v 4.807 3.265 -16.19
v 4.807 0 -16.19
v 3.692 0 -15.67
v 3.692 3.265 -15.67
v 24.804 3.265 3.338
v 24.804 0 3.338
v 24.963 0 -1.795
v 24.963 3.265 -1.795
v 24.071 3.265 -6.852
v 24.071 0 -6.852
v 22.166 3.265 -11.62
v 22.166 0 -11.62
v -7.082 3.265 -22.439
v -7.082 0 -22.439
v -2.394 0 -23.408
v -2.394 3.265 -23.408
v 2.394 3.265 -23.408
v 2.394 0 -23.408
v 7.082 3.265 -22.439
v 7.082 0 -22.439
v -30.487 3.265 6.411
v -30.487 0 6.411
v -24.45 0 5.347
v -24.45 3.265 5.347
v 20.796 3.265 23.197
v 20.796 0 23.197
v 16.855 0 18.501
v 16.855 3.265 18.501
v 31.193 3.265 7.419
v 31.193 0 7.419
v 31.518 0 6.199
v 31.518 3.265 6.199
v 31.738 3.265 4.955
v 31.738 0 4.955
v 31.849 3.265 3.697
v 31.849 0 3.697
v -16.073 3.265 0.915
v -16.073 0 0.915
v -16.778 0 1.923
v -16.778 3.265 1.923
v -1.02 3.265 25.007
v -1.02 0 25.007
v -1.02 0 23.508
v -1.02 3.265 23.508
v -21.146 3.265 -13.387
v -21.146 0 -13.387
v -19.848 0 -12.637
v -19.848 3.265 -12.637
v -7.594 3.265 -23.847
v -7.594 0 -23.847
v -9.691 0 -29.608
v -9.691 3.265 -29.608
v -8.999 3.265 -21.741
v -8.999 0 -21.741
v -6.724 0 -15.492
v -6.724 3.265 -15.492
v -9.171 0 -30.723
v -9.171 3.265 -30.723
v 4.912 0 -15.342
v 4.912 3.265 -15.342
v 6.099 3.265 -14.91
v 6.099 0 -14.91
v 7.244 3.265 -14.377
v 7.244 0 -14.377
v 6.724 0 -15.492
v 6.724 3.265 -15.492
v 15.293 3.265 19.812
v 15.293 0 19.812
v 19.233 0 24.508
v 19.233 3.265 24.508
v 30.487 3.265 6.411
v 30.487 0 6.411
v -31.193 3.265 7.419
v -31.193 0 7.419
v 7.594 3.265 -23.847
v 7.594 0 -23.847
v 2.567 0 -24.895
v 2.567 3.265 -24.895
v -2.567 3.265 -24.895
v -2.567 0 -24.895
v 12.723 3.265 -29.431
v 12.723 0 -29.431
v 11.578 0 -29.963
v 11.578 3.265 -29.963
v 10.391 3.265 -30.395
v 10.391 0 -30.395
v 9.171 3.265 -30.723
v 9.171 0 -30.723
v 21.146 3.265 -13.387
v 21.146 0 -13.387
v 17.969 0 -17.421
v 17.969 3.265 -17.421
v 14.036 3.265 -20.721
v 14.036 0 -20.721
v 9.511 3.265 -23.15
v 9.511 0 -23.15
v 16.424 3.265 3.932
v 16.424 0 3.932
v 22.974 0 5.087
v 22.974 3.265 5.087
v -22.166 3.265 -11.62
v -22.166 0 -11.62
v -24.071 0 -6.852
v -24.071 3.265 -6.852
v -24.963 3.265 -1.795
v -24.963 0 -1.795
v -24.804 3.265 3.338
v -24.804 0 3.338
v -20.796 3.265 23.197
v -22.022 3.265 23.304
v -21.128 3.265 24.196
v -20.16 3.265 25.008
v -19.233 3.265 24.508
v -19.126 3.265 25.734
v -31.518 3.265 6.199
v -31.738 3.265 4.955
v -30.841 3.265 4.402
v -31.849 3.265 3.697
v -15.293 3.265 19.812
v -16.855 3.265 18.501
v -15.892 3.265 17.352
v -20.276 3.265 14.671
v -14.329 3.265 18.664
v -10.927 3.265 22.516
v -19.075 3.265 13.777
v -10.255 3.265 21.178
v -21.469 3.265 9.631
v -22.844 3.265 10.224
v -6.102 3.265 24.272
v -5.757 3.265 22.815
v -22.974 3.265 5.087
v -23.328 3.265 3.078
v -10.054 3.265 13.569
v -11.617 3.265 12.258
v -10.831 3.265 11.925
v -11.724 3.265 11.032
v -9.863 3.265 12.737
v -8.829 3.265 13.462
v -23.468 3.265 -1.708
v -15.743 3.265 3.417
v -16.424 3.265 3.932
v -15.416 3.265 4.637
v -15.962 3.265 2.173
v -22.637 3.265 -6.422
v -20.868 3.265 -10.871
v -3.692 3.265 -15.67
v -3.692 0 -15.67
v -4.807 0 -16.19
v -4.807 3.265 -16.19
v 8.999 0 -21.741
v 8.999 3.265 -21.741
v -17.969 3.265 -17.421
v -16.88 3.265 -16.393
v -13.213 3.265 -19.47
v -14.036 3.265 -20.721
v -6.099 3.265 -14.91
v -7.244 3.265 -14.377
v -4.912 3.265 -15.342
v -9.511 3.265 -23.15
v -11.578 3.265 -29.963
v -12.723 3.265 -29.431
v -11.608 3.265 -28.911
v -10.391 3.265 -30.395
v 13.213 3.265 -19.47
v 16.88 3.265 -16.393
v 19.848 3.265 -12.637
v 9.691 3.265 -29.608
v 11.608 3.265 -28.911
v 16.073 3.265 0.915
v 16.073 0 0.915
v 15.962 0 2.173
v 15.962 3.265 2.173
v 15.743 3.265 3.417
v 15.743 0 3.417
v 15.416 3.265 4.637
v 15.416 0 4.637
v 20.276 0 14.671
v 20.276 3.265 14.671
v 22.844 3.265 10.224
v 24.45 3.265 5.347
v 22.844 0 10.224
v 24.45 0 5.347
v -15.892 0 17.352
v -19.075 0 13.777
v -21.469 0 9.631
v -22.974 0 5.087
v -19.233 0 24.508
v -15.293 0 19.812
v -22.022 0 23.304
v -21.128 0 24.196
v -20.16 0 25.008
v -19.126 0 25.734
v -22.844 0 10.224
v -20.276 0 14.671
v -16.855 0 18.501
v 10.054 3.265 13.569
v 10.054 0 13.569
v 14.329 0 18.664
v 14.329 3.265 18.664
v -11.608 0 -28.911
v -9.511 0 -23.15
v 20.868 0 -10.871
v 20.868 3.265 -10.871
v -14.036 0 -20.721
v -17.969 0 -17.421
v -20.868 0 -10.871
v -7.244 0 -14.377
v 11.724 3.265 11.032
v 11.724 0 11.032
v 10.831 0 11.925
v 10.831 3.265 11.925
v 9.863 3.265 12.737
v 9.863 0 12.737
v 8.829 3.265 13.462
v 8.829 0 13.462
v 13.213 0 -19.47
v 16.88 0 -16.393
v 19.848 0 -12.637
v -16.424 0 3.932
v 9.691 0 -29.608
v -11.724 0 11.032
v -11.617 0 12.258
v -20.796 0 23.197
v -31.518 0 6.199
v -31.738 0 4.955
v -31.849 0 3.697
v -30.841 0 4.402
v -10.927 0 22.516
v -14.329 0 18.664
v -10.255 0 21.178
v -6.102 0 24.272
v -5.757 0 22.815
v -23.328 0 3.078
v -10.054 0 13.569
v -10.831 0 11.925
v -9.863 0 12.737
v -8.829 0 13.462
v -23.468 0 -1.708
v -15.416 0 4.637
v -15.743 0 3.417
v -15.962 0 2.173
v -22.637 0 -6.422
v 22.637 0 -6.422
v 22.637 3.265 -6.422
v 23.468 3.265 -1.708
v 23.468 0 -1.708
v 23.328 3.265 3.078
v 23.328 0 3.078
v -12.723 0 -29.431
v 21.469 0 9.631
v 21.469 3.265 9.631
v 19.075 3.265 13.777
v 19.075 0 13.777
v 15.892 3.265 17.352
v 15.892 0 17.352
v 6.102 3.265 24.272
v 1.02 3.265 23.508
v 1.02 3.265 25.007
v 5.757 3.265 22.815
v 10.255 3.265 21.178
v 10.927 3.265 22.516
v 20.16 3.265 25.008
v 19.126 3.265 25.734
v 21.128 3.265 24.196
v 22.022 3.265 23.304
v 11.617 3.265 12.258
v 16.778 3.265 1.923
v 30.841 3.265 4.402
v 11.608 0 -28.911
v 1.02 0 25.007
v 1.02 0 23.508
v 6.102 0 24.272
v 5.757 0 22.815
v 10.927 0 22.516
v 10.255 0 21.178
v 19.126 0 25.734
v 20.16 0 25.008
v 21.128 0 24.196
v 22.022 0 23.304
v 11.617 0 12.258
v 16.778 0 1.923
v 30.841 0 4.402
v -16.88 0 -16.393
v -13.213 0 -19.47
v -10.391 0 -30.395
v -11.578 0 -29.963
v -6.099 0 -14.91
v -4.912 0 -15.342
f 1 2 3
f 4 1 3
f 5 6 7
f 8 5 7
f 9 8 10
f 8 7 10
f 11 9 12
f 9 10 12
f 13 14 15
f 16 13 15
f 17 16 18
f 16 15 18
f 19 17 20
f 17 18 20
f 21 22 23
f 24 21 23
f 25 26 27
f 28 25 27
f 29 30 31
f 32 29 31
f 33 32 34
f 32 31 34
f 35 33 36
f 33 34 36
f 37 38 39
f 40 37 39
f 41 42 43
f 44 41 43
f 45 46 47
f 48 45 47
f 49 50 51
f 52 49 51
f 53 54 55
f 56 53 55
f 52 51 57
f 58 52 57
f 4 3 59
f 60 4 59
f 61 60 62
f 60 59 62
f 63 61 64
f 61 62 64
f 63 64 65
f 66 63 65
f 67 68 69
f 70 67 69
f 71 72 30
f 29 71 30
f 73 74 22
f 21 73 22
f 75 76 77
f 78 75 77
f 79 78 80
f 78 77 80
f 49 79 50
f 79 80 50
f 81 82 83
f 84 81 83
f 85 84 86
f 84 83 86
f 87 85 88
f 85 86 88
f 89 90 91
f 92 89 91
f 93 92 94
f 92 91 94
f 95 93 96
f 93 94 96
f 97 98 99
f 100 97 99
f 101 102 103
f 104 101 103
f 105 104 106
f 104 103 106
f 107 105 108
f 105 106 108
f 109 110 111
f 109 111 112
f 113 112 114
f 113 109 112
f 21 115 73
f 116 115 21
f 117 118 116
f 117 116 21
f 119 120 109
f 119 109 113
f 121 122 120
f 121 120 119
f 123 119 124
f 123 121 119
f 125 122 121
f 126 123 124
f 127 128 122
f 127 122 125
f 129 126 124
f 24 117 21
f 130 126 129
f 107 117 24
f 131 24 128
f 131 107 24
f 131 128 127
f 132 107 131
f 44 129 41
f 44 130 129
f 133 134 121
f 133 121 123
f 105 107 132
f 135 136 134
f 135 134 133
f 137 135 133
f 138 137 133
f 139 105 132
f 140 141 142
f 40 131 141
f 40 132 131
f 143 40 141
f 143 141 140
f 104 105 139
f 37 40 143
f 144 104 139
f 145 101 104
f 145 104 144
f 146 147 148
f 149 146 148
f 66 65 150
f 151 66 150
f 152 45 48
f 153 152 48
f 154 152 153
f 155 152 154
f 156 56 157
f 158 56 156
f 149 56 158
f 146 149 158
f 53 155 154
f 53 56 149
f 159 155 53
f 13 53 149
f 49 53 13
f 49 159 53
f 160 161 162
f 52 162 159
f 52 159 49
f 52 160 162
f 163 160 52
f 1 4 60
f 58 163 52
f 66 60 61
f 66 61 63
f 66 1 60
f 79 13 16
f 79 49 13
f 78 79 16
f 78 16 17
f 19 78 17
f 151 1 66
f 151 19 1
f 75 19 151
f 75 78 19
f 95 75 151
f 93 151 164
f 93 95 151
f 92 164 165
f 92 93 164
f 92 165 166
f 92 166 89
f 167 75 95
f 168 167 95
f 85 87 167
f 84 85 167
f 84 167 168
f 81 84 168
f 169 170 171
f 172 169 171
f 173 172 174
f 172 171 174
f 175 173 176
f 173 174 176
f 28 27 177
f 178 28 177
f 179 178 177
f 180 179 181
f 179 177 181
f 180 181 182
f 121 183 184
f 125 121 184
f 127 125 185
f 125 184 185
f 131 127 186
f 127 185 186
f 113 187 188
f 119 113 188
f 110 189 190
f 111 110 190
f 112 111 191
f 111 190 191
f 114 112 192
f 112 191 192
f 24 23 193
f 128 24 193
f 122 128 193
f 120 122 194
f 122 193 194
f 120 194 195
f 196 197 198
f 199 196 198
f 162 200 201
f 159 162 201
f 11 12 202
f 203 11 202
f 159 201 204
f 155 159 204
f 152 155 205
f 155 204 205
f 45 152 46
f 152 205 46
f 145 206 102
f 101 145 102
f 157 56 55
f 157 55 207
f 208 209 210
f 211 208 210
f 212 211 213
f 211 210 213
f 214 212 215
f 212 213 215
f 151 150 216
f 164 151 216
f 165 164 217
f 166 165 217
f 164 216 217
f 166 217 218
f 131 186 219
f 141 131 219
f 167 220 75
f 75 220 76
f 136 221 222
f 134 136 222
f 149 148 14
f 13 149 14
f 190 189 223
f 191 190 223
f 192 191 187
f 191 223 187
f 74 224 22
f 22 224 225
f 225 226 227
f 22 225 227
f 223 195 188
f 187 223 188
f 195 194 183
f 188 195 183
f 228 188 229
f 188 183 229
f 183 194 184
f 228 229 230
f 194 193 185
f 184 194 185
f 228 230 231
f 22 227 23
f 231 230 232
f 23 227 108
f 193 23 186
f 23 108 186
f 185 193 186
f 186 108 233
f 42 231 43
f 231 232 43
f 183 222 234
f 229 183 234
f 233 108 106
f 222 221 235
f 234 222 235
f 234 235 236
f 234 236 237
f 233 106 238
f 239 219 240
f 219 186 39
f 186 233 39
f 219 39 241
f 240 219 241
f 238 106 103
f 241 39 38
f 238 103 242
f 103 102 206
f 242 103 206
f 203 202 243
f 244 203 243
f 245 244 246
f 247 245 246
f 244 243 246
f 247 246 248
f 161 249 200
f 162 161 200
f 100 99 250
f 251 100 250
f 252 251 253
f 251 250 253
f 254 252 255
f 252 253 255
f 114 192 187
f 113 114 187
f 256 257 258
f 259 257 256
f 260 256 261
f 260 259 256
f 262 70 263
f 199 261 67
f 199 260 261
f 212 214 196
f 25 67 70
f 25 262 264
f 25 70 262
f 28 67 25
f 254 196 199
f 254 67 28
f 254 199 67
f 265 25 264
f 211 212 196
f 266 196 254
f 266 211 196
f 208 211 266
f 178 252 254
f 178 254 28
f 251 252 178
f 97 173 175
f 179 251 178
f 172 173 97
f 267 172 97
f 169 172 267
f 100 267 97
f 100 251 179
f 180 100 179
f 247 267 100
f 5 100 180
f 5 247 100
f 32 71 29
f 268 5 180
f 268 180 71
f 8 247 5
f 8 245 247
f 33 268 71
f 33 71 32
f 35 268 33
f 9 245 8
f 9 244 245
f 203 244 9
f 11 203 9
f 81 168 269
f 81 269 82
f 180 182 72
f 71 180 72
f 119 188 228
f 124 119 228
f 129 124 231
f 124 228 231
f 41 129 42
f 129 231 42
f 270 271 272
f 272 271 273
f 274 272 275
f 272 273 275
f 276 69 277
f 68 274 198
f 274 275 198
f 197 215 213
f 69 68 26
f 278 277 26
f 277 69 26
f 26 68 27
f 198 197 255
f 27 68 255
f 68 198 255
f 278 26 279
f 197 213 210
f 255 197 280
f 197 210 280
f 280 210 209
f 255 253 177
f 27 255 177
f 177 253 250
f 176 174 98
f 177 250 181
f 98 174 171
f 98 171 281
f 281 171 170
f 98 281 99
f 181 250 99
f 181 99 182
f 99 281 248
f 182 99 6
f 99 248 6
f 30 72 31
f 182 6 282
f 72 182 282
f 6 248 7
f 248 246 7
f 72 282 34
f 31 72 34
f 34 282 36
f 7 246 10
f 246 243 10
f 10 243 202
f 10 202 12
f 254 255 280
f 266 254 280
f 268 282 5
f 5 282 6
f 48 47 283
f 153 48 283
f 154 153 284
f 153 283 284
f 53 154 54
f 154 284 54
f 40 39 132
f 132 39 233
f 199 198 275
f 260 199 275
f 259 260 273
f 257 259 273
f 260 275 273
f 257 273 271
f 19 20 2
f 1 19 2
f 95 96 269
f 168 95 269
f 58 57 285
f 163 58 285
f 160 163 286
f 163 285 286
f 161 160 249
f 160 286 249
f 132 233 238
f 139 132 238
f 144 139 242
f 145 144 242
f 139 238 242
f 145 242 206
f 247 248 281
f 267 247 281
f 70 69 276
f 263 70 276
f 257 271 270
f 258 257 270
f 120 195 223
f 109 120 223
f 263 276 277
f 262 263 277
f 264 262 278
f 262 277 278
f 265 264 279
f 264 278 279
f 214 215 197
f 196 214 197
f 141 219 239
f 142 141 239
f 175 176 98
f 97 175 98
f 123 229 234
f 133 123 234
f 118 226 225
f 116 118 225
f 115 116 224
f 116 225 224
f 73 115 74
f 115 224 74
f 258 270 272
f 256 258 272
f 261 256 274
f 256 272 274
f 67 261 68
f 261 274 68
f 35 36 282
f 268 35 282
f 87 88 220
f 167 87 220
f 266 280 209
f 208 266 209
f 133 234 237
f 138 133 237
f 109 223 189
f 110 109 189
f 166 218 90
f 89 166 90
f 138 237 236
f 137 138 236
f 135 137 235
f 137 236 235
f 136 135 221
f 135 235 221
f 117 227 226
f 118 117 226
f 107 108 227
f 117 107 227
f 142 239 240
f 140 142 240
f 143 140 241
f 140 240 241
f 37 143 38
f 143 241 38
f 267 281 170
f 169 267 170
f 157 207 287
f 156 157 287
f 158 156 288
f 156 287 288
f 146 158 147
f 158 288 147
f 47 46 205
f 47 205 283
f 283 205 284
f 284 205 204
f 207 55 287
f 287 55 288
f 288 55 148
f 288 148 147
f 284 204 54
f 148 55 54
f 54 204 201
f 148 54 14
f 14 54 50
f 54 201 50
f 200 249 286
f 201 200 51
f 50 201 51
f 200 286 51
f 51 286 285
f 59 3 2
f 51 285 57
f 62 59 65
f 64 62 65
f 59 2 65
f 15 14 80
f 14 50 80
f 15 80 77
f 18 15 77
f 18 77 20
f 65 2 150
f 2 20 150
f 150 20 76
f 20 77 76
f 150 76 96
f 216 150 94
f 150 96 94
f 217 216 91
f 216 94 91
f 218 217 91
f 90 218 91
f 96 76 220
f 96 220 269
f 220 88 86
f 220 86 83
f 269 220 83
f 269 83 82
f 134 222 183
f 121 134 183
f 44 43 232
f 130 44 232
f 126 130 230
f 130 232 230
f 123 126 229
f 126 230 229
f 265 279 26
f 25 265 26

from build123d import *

# Parameters (mm, degrees)
BOSS_EXTRUDE1_DEPTH   = 3.265
BOSS_EXTRUDE1_2_DEPTH = 3.265
BOSS_EXTRUDE1_3_DEPTH = 3.265


with BuildPart() as part:
    # Sketch1 → Boss-Extrude1 (new body)
    with BuildSketch(Plane(origin=(0, 0, 0), x_dir=(1, 0, 0), z_dir=(0, 1, 0))):
        with BuildLine():
            Line((-6.724046162, 15.491884508), (-7.243917376, 14.377017092))
            ThreePointArc((-7.243917376, 14.377017092), (-5.510136615, 15.138975927), (-3.692205799, 15.669734386))
            Line((-3.692205799, 15.669734386), (-4.807073215, 16.189605601))
            Line((-4.807073215, 16.189605601), (-7.08168258, 22.43904347))
            ThreePointArc((-7.08168258, 22.43904347), (0, 23.53), (7.08168258, 22.43904347))
            Line((7.08168258, 22.43904347), (4.807073215, 16.189605601))
            Line((4.807073215, 16.189605601), (3.692205799, 15.669734386))
            ThreePointArc((3.692205799, 15.669734386), (5.510136615, 15.138975927), (7.243917376, 14.377017092))
            Line((7.243917376, 14.377017092), (6.724046162, 15.491884508))
            Line((6.724046162, 15.491884508), (8.998655527, 21.741322377))
            ThreePointArc((8.998655527, 21.741322377), (15.124792456, 18.025025747), (19.848422704, 12.63728674))
            Line((19.848422704, 12.63728674), (21.146442856, 13.386699025))
            ThreePointArc((21.146442856, 13.386699025), (16.087366901, 19.1721773), (9.511283721, 23.149756764))
            Line((9.511283721, 23.149756764), (11.608093808, 28.910695133))
            Line((11.608093808, 28.910695133), (12.722961226, 29.430566348))
            ThreePointArc((12.722961226, 29.430566348), (10.988981231, 30.191977795), (9.171249647, 30.723283643))
            Line((9.171249647, 30.723283643), (9.691120862, 29.608416225))
            Line((9.691120862, 29.608416225), (7.594310774, 23.847477856))
            ThreePointArc((7.594310774, 23.847477856), (0, 25.0275), (-7.594310774, 23.847477856))
            Line((-7.594310774, 23.847477856), (-9.691120862, 29.608416225))
            Line((-9.691120862, 29.608416225), (-9.171249647, 30.723283643))
            ThreePointArc((-9.171249647, 30.723283643), (-10.988981231, 30.191977795), (-12.722961226, 29.430566348))
            Line((-12.722961226, 29.430566348), (-11.608093808, 28.910695133))
            Line((-11.608093808, 28.910695133), (-9.511283721, 23.149756764))
            ThreePointArc((-9.511283721, 23.149756764), (-16.087366901, 19.1721773), (-21.146442856, 13.386699025))
            Line((-21.146442856, 13.386699025), (-19.848422704, 12.63728674))
            ThreePointArc((-19.848422704, 12.63728674), (-15.124792456, 18.025025747), (-8.998655527, 21.741322377))
            Line((-8.998655527, 21.741322377), (-6.724046162, 15.491884508))
        make_face()
    extrude(amount=BOSS_EXTRUDE1_DEPTH)


with BuildPart() as body_2:
    # Sketch1 → Boss-Extrude1 2 (new body)
    with BuildSketch(Plane(origin=(0, 0, 0), x_dir=(1, 0, 0), z_dir=(0, 1, 0))):
        with BuildLine():
            Line((16.778388617, -1.922747462), (16.07282072, -0.915092075))
            ThreePointArc((16.07282072, -0.915092075), (15.865806048, -2.797569677), (15.416490948, -4.637323176))
            Line((15.416490948, -4.637323176), (16.424146335, -3.931755278))
            Line((16.424146335, -3.931755278), (22.973622971, -5.086604719))
            ThreePointArc((22.973622971, -5.086604719), (20.377577751, -11.765), (15.891940391, -17.352438751))
            Line((15.891940391, -17.352438751), (11.61707312, -12.257850322))
            Line((11.61707312, -12.257850322), (11.72428515, -11.032411211))
            ThreePointArc((11.72428515, -11.032411211), (10.355669433, -12.34140625), (8.828903344, -13.461925016))
            Line((8.828903344, -13.461925016), (10.054342456, -13.569137046))
            Line((10.054342456, -13.569137046), (14.329209727, -18.663725475))
            ThreePointArc((14.329209727, -18.663725475), (8.047733972, -22.110967367), (1.02, -23.507881657))
            Line((1.02, -23.507881657), (1.02, -25.006706226))
            ThreePointArc((1.02, -25.006706226), (8.559909137, -23.518157067), (15.292635589, -19.811891707))
            Line((15.292635589, -19.811891707), (19.233349522, -24.508251694))
            Line((19.233349522, -24.508251694), (19.126137492, -25.733690807))
            ThreePointArc((19.126137492, -25.733690807), (20.652529145, -24.612725805), (22.021519299, -23.304177))
            Line((22.021519299, -23.304177), (20.796080186, -23.19696497))
            Line((20.796080186, -23.19696497), (16.855366253, -18.500604983))
            ThreePointArc((16.855366253, -18.500604983), (21.674450793, -12.51375), (24.449677027, -5.346872874))
            Line((24.449677027, -5.346872874), (30.487201048, -6.411451255))
            Line((30.487201048, -6.411451255), (31.192768946, -7.419106643))
            ThreePointArc((31.192768946, -7.419106643), (31.641510376, -5.57925199), (31.849098718, -3.696875541))
            Line((31.849098718, -3.696875541), (30.84144333, -4.402443439))
            Line((30.84144333, -4.402443439), (24.803919309, -3.337865057))
            ThreePointArc((24.803919309, -3.337865057), (24.647276039, 4.345979767), (22.166442856, 11.620007201))
            Line((22.166442856, 11.620007201), (20.868422704, 10.870594917))
            ThreePointArc((20.868422704, 10.870594917), (23.172526428, 4.085941621), (23.327865254, -3.077596902))
            Line((23.327865254, -3.077596902), (16.778388617, -1.922747462))
        make_face()
    extrude(amount=BOSS_EXTRUDE1_2_DEPTH)


with BuildPart() as body_3:
    # Sketch1 → Boss-Extrude1 3 (new body)
    with BuildSketch(Plane(origin=(0, 0, 0), x_dir=(1, 0, 0), z_dir=(0, 1, 0))):
        with BuildLine():
            Line((-10.054342456, -13.569137046), (-8.828903344, -13.461925016))
            ThreePointArc((-8.828903344, -13.461925016), (-10.355669433, -12.34140625), (-11.72428515, -11.032411211))
            Line((-11.72428515, -11.032411211), (-11.61707312, -12.257850322))
            Line((-11.61707312, -12.257850322), (-15.891940391, -17.352438751))
            ThreePointArc((-15.891940391, -17.352438751), (-20.377577751, -11.765), (-22.973622971, -5.086604719))
            Line((-22.973622971, -5.086604719), (-16.424146335, -3.931755278))
            Line((-16.424146335, -3.931755278), (-15.416490948, -4.637323176))
            ThreePointArc((-15.416490948, -4.637323176), (-15.865806048, -2.797569677), (-16.07282072, -0.915092075))
            Line((-16.07282072, -0.915092075), (-16.778388617, -1.922747462))
            Line((-16.778388617, -1.922747462), (-23.327865254, -3.077596902))
            ThreePointArc((-23.327865254, -3.077596902), (-23.172526428, 4.085941621), (-20.868422704, 10.870594917))
            Line((-20.868422704, 10.870594917), (-22.166442856, 11.620007201))
            ThreePointArc((-22.166442856, 11.620007201), (-24.647276039, 4.345979767), (-24.803919309, -3.337865057))
            Line((-24.803919309, -3.337865057), (-30.84144333, -4.402443439))
            Line((-30.84144333, -4.402443439), (-31.849098718, -3.696875541))
            ThreePointArc((-31.849098718, -3.696875541), (-31.641510376, -5.57925199), (-31.192768946, -7.419106643))
            Line((-31.192768946, -7.419106643), (-30.487201048, -6.411451255))
            Line((-30.487201048, -6.411451255), (-24.449677027, -5.346872874))
            ThreePointArc((-24.449677027, -5.346872874), (-21.674450793, -12.51375), (-16.855366253, -18.500604983))
            Line((-16.855366253, -18.500604983), (-20.796080186, -23.19696497))
            Line((-20.796080186, -23.19696497), (-22.021519299, -23.304177))
            ThreePointArc((-22.021519299, -23.304177), (-20.652529145, -24.612725805), (-19.126137492, -25.733690807))
            Line((-19.126137492, -25.733690807), (-19.233349522, -24.508251694))
            Line((-19.233349522, -24.508251694), (-15.292635589, -19.811891707))
            ThreePointArc((-15.292635589, -19.811891707), (-8.559909137, -23.518157067), (-1.02, -25.006706226))
            Line((-1.02, -25.006706226), (-1.02, -23.507881657))
            ThreePointArc((-1.02, -23.507881657), (-8.047733972, -22.110967367), (-14.329209727, -18.663725475))
            Line((-14.329209727, -18.663725475), (-10.054342456, -13.569137046))
        make_face()
    extrude(amount=BOSS_EXTRUDE1_3_DEPTH)


solid = Compound([part.part, body_2.part, body_3.part])
